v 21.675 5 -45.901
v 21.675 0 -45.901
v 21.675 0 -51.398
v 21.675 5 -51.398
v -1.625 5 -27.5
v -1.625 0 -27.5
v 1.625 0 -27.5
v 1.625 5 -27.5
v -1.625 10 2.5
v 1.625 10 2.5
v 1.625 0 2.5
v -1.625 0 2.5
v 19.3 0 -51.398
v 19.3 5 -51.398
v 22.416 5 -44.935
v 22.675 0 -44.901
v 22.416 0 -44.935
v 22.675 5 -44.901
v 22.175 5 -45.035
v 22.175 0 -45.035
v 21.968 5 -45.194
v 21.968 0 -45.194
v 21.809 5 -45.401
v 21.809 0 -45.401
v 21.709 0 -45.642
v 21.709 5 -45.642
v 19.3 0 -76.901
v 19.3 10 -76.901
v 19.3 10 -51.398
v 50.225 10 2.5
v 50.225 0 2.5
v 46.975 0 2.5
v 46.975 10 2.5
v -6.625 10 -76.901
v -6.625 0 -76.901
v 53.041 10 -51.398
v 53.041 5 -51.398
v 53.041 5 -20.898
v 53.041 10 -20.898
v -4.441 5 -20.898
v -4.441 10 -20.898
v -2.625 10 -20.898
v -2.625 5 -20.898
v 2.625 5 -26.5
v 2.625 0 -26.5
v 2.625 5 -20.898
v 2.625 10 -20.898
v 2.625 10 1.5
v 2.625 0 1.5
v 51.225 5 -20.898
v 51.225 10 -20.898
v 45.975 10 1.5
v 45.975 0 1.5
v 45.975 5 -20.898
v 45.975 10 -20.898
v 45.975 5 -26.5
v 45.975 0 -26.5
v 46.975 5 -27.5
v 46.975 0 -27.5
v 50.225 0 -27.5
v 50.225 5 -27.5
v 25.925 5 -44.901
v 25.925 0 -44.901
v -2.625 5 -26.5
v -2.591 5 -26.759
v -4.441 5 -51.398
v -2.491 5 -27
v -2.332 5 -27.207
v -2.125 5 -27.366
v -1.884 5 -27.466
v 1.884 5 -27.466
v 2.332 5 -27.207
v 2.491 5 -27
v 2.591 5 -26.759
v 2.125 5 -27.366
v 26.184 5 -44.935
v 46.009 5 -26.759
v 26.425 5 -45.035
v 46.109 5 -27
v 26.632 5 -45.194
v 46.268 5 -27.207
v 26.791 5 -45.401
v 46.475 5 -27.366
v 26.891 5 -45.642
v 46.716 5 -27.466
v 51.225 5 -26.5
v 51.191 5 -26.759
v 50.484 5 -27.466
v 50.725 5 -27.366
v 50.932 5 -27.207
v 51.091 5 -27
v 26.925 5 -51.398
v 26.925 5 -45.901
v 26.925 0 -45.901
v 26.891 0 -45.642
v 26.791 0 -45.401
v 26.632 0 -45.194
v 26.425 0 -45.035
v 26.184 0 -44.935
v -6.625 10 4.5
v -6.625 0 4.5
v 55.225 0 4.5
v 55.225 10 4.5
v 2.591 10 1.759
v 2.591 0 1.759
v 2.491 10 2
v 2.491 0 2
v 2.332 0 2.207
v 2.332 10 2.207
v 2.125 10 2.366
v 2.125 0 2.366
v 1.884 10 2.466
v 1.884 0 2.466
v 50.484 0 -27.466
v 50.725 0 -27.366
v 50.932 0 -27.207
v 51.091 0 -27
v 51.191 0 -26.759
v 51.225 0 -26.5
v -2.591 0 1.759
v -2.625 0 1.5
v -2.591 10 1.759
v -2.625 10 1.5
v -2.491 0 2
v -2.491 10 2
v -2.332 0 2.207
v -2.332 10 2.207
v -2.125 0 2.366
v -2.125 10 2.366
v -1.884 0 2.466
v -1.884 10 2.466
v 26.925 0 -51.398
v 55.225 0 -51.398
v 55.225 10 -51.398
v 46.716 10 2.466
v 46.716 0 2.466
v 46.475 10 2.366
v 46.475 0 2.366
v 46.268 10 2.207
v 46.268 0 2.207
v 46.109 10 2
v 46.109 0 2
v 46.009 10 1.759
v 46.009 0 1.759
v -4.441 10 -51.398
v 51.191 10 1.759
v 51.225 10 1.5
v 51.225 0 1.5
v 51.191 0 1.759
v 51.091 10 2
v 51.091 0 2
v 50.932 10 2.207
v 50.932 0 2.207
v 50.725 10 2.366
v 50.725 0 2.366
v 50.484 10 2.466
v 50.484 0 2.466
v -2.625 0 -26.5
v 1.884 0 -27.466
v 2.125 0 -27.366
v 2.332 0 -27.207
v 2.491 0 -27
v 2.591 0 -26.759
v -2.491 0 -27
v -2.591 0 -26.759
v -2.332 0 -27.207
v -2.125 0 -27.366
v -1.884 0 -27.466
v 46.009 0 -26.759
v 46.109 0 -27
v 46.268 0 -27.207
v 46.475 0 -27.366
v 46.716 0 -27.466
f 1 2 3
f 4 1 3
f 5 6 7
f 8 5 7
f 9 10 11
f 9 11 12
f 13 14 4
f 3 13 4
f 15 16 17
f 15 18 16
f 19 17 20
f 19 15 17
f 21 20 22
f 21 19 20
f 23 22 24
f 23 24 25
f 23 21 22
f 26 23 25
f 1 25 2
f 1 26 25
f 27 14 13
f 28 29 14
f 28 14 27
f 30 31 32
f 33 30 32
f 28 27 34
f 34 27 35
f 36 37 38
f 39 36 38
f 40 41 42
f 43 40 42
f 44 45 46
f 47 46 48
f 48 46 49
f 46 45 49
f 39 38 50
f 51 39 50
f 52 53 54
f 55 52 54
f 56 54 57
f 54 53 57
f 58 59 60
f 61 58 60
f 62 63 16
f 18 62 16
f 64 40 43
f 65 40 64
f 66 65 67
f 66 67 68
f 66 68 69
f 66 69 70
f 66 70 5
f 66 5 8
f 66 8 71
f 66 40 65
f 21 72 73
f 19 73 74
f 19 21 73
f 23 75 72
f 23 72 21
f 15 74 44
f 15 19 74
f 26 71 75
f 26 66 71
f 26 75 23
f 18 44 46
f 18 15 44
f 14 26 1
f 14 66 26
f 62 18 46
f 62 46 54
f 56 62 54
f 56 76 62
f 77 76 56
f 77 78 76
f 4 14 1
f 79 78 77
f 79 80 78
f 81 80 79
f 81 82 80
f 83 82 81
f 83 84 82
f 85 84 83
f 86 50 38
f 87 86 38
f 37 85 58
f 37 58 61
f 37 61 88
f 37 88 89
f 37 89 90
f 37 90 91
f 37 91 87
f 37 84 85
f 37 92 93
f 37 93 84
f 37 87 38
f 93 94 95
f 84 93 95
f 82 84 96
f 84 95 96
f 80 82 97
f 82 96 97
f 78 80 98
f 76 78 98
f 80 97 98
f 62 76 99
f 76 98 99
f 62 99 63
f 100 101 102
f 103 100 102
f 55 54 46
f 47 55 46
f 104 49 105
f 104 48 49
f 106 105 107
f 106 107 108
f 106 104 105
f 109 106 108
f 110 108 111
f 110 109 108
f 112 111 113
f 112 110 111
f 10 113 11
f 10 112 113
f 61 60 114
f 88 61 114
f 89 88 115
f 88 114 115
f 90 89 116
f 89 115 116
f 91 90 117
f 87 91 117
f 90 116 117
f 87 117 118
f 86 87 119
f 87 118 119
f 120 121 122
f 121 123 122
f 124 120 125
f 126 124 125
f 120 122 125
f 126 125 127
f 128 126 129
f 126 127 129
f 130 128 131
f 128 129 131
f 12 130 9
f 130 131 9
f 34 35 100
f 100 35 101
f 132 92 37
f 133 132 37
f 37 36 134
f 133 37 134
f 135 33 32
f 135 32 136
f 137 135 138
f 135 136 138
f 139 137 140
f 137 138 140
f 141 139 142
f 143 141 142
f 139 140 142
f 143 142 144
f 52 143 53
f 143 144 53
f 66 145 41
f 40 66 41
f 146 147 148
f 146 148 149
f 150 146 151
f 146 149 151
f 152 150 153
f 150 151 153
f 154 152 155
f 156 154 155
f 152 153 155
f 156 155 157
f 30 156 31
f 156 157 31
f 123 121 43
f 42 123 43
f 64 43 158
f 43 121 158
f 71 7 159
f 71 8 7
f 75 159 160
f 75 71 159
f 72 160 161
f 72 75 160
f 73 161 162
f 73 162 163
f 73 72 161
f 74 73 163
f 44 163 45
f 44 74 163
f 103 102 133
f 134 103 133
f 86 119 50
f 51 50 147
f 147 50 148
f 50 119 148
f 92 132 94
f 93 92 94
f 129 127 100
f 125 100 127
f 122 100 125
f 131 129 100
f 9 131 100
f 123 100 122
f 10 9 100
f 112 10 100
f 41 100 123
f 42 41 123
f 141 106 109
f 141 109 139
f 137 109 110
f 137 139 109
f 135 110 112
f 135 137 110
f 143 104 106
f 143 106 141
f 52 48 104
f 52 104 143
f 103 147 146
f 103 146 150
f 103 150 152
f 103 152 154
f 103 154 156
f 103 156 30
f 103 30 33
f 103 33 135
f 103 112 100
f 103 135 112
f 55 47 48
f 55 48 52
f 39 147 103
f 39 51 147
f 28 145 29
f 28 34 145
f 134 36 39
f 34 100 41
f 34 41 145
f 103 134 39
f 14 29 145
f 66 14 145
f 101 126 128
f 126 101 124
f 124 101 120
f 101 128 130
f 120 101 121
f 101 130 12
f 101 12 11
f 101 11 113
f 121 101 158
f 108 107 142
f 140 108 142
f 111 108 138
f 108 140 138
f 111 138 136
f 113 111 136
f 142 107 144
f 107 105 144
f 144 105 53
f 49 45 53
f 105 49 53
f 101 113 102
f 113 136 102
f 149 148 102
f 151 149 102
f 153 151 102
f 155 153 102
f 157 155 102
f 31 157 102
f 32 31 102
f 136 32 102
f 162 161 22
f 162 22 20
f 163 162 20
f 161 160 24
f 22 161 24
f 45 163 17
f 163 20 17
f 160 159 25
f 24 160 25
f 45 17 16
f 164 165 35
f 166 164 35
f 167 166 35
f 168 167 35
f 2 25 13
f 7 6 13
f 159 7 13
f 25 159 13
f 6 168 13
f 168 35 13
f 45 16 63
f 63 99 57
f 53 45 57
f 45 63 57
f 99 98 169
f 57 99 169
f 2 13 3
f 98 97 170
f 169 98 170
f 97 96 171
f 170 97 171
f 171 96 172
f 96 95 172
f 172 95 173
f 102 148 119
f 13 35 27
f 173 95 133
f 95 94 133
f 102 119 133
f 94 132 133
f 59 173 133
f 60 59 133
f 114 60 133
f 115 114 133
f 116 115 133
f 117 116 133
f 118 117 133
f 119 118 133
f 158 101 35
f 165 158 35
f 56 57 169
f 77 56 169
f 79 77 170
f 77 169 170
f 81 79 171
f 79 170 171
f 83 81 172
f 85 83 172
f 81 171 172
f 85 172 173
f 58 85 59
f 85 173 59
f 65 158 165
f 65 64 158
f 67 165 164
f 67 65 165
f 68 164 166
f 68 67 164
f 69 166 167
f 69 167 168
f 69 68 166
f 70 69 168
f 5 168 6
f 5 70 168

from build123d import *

# Parameters (mm, degrees)
BOSS_EXTRUDE5_DEPTH = 10
CUT_EXTRUDE6_DEPTH  = 5
FILLET4_R           = 1
MIRROR25_DEPTH      = 10
MIRROR25_2_DEPTH    = 5
SKETCH20_W          = 35.925
SKETCH20_H          = 25.502594227
CUT_EXTRUDE7_DEPTH  = 10


# Read off the part's stored shape, not the designer's step: Mirror25
with BuildPart() as part:
    # Sketch15 → Boss-Extrude5 (new body)
    with BuildSketch(Plane(origin=(0, 0, 0), x_dir=(1, 0, 0), z_dir=(0, 1, 0))):
        Polygon((24.3, 76.900659127), (-6.625, 76.900659127), (-6.625, -4.5), (24.3, -4.5), (24.3, 44.900659127), (21.675, 44.900659127), (21.675, 47.400659127), (21.675, 72.400659127), (21.675, 74.900659127), (24.3, 74.900659127), align=None)
        Polygon((-2.625, 25), (-2.625, 0), (-2.625, -2.5), (0, -2.5), (2.625, -2.5), (2.625, 0), (2.625, 25), (2.625, 27.5), (0, 27.5), (-2.625, 27.5), align=None, mode=Mode.SUBTRACT)
    extrude(amount=BOSS_EXTRUDE5_DEPTH)

    # Sketch18 → Cut-Extrude6 (cut)
    with BuildSketch(Plane(origin=(0, 10, 0), x_dir=(1, 0, 0), z_dir=(0, 1, 0))):
        Polygon((21.675, 51.3980649), (-4.44053483, 51.3980649), (-4.44053483, 20.8980649), (24.3, 20.8980649), (24.3, 51.3980649), align=None)
    extrude(amount=-CUT_EXTRUDE6_DEPTH, mode=Mode.SUBTRACT)

    # Fillet4
    fillet4_edges = [part.edges().sort_by_distance(p)[0] for p in [
        (21.675, 5, -74.900659127),
        (-2.625, 5, 2.5),
        (2.625, 5, 2.5),
        (2.625, 2.5, -27.5),
        (-2.625, 2.5, -27.5),
        (21.675, 2.5, -44.900659127),
    ]]
    fillet(fillet4_edges, radius=FILLET4_R)

    # Mirror25 outline → Mirror25 (add)
    with BuildSketch(Plane(origin=(0, 0, 0), x_dir=(1, 0, 0), z_dir=(0, 1, 0))):
        with BuildLine():
            Line((45.975, 20.8980649), (24.3, 20.8980649))
            Line((24.3, 20.8980649), (24.3, -4.5))
            Line((24.3, -4.5), (55.225, -4.5))
            Line((55.225, -4.5), (55.225, 76.900659127))
            Line((55.225, 76.900659127), (24.3, 76.900659127))
            Line((24.3, 76.900659127), (24.3, 74.900659127))
            Line((24.3, 74.900659127), (25.925, 74.900659127))
            ThreePointArc((25.925, 74.900659127), (26.632106781, 74.607765908), (26.925, 73.900659127))
            Line((26.925, 73.900659127), (26.925, 51.3980649))
            Line((26.925, 51.3980649), (53.04053483, 51.3980649))
            Line((53.04053483, 51.3980649), (53.04053483, 20.8980649))
            Line((53.04053483, 20.8980649), (51.225, 20.8980649))
            Line((51.225, 20.8980649), (51.225, -1.5))
            ThreePointArc((51.225, -1.5), (50.932106781, -2.207106781), (50.225, -2.5))
            Line((50.225, -2.5), (46.975, -2.5))
            ThreePointArc((46.975, -2.5), (46.267893219, -2.207106781), (45.975, -1.5))
            Line((45.975, -1.5), (45.975, 20.8980649))
        make_face()
    extrude(amount=MIRROR25_DEPTH)

    # Mirror25 2 outline → Mirror25 2 (add)
    with BuildSketch(Plane(origin=(0, 0, 0), x_dir=(1, 0, 0), z_dir=(0, 1, 0))):
        with BuildLine():
            Line((25.925, 44.900659127), (24.3, 44.900659127))
            Line((24.3, 44.900659127), (24.3, 20.8980649))
            Line((24.3, 20.8980649), (45.975, 20.8980649))
            Line((45.975, 20.8980649), (45.975, 26.5))
            ThreePointArc((45.975, 26.5), (46.267893219, 27.207106781), (46.975, 27.5))
            Line((46.975, 27.5), (50.225, 27.5))
            ThreePointArc((50.225, 27.5), (50.932106781, 27.207106781), (51.225, 26.5))
            Line((51.225, 26.5), (51.225, 20.8980649))
            Line((51.225, 20.8980649), (53.04053483, 20.8980649))
            Line((53.04053483, 20.8980649), (53.04053483, 51.3980649))
            Line((53.04053483, 51.3980649), (26.925, 51.3980649))
            Line((26.925, 51.3980649), (26.925, 45.900659127))
            ThreePointArc((26.925, 45.900659127), (26.632106781, 45.193552346), (25.925, 44.900659127))
        make_face()
    extrude(amount=MIRROR25_2_DEPTH)

    # Sketch20 → Cut-Extrude7 (cut)
    with BuildSketch(Plane(origin=(0, 10, 0), x_dir=(1, 0, 0), z_dir=(0, 1, 0))):
        with Locations((37.2625, 64.149362014)):
            Rectangle(SKETCH20_W, SKETCH20_H)
    extrude(amount=-CUT_EXTRUDE7_DEPTH, mode=Mode.SUBTRACT)


solid = part.part
